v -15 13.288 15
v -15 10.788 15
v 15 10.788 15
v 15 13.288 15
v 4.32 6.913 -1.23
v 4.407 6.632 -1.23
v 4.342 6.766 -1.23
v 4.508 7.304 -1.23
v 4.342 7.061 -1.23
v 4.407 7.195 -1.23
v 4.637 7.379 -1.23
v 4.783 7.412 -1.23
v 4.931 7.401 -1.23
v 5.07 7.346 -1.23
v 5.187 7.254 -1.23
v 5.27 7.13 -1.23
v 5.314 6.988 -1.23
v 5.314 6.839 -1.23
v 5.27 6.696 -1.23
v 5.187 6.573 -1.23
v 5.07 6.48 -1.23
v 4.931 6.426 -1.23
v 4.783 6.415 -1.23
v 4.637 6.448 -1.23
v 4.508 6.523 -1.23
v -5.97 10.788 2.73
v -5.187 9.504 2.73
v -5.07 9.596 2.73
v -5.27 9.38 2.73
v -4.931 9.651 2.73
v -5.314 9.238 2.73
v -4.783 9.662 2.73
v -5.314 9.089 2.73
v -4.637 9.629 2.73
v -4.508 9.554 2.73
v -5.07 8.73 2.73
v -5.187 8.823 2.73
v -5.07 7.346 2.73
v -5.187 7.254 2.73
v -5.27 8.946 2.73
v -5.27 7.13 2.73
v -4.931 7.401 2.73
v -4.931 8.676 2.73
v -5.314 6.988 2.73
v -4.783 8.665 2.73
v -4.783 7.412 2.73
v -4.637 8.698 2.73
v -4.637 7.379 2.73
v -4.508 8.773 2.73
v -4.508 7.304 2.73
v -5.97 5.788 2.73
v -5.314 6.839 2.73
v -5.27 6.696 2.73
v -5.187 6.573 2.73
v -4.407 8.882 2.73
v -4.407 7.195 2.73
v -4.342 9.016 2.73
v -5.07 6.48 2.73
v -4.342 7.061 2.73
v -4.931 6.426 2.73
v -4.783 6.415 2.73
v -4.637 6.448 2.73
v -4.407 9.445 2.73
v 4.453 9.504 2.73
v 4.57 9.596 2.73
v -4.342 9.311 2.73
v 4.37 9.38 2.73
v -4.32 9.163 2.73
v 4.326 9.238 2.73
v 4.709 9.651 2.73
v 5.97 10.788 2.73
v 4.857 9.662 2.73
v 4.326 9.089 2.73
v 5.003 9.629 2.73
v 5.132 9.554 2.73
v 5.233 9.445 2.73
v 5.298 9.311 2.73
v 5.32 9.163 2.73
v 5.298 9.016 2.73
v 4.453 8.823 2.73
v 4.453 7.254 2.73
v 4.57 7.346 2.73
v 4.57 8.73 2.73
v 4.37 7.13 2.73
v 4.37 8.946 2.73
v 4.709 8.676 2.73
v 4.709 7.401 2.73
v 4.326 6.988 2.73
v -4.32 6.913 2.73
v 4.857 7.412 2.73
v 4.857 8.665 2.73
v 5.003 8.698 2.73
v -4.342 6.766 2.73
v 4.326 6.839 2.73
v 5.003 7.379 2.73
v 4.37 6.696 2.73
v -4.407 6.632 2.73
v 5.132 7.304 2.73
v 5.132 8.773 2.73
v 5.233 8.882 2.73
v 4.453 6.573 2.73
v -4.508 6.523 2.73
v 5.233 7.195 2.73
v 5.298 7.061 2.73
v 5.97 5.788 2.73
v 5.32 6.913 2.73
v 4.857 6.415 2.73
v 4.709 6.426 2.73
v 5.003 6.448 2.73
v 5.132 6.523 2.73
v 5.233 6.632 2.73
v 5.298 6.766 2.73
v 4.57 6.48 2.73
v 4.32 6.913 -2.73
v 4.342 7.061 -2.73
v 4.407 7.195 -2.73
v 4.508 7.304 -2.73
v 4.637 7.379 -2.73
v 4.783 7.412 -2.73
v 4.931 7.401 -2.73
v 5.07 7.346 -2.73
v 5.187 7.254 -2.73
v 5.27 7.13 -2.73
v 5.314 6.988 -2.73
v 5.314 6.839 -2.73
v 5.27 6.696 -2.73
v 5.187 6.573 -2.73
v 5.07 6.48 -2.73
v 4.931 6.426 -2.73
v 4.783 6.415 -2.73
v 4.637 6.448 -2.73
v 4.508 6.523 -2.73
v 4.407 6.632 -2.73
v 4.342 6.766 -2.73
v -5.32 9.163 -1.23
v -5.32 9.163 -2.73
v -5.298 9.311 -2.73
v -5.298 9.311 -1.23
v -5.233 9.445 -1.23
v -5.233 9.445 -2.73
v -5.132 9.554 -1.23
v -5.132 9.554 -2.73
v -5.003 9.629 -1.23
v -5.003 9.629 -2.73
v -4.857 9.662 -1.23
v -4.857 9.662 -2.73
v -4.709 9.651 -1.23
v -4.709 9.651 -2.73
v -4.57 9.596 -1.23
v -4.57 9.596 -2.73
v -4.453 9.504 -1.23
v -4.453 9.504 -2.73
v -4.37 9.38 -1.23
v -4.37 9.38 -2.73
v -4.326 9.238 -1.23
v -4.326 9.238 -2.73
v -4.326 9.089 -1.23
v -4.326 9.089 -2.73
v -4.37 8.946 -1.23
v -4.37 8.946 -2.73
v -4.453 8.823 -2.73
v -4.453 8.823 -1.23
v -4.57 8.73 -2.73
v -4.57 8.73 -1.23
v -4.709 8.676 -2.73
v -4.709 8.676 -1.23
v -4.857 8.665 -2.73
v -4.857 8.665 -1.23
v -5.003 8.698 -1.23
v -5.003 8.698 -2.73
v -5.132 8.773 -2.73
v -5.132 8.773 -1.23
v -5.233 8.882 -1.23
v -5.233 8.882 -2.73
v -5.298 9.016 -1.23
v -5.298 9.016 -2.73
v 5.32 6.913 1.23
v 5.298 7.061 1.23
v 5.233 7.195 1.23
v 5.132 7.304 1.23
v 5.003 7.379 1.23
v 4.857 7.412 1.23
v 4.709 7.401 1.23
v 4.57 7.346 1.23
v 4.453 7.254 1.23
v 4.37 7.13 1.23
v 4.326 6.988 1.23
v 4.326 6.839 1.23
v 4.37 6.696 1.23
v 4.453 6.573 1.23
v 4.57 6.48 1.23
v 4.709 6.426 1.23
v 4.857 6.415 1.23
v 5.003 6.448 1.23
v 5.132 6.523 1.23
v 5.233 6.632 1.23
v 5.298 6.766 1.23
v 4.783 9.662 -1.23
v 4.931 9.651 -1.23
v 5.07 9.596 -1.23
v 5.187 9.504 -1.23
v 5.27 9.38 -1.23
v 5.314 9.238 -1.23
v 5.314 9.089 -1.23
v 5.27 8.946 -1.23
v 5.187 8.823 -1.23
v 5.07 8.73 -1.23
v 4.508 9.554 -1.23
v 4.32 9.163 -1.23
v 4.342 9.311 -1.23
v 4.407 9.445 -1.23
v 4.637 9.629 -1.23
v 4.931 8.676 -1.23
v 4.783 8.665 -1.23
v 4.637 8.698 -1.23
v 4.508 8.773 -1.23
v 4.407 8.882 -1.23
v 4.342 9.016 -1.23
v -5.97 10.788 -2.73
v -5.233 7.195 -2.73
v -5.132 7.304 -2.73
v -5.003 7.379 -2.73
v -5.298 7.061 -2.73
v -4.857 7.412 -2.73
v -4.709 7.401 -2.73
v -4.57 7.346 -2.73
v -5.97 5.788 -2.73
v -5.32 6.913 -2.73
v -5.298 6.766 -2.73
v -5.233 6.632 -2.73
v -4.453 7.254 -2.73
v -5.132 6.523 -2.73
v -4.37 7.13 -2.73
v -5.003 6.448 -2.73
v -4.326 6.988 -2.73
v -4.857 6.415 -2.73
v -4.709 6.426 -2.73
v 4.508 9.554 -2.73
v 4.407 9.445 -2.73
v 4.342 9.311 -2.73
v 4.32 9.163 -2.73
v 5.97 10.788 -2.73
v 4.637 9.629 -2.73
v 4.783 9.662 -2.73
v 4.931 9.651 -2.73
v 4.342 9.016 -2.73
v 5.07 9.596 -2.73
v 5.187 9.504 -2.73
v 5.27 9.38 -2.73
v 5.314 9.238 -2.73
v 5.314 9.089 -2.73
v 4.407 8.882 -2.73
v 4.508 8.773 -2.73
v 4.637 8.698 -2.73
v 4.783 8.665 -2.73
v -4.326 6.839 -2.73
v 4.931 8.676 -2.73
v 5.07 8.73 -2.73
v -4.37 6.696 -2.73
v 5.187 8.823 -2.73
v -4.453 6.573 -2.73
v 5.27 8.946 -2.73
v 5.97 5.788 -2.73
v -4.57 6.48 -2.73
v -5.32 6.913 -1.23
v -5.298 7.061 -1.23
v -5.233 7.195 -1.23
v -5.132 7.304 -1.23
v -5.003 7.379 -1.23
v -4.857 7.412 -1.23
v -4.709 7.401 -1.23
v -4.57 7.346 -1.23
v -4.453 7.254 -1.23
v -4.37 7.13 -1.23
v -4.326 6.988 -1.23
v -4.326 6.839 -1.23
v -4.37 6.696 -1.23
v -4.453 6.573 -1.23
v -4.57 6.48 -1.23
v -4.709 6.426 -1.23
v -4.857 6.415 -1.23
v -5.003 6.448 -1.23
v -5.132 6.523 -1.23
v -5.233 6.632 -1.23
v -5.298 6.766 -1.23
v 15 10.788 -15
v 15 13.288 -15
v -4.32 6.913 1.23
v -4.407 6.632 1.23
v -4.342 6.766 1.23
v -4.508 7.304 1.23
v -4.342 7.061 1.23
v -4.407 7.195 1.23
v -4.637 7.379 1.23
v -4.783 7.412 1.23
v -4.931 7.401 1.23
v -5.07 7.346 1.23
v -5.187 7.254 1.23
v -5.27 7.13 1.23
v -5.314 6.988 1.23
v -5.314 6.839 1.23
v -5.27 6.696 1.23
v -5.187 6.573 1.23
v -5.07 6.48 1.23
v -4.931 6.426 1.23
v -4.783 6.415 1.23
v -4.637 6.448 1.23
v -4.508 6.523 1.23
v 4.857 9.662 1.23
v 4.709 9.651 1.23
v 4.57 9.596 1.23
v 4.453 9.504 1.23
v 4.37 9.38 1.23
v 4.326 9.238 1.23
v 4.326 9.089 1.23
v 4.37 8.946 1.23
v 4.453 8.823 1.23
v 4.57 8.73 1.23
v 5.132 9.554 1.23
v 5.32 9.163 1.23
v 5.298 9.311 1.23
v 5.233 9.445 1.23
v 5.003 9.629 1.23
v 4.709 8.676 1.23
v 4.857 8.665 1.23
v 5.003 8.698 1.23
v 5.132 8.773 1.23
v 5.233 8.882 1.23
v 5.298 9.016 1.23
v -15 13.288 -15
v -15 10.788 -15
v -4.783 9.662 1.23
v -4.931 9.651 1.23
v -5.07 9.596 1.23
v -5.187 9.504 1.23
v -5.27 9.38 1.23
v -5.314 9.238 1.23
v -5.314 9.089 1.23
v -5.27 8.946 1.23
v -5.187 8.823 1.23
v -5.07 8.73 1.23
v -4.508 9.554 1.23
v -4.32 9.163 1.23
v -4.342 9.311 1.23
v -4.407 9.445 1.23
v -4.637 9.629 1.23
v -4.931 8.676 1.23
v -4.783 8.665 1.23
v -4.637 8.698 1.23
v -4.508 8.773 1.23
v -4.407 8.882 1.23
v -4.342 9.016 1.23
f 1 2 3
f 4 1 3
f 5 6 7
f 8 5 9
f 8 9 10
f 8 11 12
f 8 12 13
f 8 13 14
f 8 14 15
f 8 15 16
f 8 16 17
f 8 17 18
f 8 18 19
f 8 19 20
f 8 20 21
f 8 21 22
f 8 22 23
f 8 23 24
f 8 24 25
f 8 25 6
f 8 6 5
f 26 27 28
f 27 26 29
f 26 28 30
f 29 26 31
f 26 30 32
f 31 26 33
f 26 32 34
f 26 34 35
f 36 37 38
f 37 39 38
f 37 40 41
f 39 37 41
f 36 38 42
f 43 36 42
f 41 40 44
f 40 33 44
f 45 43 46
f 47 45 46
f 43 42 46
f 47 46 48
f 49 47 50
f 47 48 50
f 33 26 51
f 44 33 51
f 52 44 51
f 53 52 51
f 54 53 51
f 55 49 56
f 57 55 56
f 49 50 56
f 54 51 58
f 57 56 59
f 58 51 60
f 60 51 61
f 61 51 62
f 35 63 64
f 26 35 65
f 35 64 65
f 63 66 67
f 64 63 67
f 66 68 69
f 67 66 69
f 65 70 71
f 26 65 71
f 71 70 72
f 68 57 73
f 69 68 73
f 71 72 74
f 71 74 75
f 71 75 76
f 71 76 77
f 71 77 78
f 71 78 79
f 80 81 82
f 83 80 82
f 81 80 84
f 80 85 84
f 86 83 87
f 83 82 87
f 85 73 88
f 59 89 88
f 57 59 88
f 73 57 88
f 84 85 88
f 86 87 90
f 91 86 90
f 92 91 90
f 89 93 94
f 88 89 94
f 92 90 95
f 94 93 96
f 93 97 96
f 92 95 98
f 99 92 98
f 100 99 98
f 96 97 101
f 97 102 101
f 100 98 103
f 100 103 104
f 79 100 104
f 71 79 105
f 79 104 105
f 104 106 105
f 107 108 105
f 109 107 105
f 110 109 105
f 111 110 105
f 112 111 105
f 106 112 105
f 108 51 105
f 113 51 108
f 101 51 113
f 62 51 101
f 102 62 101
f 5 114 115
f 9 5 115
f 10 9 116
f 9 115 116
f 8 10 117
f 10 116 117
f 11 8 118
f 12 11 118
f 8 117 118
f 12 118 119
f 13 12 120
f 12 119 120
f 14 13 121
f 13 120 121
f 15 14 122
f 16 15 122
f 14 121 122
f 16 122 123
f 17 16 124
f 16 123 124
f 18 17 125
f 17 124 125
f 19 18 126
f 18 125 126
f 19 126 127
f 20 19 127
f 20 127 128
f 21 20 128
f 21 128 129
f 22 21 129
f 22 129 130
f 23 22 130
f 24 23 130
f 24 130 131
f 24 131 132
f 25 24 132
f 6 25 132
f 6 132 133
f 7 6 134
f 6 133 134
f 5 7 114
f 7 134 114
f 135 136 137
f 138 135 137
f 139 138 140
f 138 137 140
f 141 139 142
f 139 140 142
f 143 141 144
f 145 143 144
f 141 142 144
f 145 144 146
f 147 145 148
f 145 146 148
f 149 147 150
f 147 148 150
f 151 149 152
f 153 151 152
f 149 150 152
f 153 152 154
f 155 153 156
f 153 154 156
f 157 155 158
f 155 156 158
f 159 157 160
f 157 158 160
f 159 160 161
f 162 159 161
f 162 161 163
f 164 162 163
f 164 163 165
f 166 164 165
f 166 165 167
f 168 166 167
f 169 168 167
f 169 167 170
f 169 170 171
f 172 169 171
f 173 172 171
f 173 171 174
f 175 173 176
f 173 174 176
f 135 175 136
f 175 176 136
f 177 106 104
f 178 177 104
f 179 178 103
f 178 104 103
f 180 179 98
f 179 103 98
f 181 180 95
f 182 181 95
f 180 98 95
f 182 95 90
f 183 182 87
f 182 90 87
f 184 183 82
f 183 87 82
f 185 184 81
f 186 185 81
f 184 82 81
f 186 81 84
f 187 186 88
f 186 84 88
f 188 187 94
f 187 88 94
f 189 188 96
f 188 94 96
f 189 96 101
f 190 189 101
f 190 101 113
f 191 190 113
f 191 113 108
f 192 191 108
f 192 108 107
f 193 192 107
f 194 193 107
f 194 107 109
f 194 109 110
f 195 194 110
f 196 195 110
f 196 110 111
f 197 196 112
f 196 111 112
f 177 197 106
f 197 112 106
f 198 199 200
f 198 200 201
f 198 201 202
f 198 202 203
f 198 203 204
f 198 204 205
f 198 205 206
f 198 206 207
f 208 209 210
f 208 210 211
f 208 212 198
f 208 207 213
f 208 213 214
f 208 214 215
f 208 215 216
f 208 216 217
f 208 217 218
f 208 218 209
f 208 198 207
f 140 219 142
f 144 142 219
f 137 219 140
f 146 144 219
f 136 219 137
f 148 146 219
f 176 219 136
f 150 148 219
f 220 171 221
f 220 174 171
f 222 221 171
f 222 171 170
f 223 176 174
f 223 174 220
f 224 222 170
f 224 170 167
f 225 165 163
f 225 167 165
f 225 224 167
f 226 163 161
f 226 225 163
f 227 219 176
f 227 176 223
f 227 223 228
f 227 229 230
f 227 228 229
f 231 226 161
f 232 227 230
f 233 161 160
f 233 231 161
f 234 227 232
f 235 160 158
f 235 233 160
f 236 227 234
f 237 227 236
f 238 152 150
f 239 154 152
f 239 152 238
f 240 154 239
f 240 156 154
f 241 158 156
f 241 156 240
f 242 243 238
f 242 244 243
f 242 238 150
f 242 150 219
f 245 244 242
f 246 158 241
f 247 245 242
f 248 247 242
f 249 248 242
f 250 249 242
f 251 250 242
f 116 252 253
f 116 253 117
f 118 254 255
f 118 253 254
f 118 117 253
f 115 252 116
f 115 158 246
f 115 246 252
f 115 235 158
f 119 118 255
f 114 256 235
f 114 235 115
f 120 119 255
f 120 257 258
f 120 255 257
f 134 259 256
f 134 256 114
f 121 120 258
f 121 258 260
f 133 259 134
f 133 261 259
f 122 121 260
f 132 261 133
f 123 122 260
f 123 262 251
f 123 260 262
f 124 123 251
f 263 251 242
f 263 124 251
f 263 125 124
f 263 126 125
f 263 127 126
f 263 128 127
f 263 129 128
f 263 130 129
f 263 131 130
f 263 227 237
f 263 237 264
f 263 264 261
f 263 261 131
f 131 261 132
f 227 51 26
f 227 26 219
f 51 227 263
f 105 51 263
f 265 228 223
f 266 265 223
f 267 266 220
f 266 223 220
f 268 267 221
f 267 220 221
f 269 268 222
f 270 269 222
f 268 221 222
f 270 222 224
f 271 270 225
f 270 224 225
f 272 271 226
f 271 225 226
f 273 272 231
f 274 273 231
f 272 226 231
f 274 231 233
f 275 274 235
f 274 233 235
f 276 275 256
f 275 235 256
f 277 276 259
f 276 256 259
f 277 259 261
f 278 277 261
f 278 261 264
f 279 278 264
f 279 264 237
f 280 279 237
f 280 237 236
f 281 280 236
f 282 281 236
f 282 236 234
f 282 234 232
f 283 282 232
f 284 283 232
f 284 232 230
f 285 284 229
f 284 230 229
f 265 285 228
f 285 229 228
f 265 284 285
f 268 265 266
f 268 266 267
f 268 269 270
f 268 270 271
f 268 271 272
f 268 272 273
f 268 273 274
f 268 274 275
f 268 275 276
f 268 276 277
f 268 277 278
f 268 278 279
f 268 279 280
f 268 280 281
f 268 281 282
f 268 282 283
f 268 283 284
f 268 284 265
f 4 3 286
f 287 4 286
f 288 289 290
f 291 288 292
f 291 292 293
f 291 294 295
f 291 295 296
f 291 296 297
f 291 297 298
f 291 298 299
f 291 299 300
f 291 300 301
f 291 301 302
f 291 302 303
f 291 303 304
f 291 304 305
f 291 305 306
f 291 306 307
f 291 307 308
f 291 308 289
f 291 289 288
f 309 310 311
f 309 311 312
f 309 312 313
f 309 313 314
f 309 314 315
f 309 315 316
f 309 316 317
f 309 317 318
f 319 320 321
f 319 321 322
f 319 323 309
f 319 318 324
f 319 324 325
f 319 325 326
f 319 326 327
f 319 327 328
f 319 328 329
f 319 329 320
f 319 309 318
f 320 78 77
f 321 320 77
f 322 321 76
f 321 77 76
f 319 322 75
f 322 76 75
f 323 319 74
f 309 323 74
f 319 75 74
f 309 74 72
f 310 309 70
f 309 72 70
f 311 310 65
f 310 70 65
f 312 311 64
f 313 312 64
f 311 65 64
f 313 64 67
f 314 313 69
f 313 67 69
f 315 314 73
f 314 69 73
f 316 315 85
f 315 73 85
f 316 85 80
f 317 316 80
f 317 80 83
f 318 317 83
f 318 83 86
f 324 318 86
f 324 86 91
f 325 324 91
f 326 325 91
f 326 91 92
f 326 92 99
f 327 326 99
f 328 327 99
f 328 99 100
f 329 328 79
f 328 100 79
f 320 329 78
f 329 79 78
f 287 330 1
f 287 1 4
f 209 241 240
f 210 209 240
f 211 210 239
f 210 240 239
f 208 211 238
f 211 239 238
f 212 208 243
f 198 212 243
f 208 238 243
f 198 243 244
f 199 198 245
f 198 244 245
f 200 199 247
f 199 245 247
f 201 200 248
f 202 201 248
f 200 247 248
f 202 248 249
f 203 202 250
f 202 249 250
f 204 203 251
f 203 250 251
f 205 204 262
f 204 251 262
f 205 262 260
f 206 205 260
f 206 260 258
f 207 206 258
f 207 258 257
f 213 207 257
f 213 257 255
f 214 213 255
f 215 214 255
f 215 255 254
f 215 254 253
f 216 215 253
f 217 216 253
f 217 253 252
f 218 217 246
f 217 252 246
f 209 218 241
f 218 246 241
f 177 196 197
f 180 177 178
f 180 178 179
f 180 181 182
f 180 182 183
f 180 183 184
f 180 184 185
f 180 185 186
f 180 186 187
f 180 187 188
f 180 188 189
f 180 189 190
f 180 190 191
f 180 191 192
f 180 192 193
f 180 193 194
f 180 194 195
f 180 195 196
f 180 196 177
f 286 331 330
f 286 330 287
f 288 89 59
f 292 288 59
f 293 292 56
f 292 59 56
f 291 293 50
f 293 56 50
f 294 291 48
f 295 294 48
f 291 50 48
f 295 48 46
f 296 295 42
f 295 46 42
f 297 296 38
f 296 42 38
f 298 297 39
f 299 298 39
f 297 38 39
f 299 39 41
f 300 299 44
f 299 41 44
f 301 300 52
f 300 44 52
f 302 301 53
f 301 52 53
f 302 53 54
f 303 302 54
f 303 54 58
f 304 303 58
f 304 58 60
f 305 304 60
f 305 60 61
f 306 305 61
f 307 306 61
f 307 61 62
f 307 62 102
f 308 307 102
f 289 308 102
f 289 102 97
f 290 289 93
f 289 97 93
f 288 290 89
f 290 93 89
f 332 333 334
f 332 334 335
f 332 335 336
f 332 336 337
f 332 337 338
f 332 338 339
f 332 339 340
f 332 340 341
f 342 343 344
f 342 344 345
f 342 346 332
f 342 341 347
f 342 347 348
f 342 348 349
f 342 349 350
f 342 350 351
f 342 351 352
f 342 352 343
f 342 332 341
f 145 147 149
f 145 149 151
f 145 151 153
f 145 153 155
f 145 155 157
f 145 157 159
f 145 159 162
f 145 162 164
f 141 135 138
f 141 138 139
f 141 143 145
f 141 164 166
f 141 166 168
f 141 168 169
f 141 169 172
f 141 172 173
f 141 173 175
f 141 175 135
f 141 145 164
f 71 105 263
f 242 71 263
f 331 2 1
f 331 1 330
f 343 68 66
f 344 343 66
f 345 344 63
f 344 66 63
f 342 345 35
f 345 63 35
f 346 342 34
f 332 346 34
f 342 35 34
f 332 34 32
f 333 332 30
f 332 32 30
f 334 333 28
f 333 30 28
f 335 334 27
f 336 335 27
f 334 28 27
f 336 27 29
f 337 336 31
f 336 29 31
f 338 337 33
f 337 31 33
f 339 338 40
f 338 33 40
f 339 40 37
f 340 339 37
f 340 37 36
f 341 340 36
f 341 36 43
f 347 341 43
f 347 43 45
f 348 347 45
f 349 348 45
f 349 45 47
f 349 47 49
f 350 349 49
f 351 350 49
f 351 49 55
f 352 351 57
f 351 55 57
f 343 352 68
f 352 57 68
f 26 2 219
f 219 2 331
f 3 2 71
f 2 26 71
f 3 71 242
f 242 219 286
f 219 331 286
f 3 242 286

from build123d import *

# Parameters (mm, degrees)
IZIM1_W                     = 23.88
IZIM1_H                     = 10.92
Y_KSEKLIK_EKSTR_ZYON5_DEPTH = 10
IZIM4_W                     = 60
IZIM4_H                     = 60
Y_KSEKLIK_EKSTR_ZYON6_DEPTH = 5
IZIM5_R                     = 1
KES_EKSTR_ZYON1_DEPTH       = 3
IZIM6_R                     = 1
KES_EKSTR_ZYON2_DEPTH       = 3
L_EK1_SCALE                 = 0.5


with BuildPart() as part:
    # Çizim1 → Yükseklik-Ekstrüzyon5 (new body)
    with BuildSketch(Plane(origin=(0, 0, 0), x_dir=(1, 0, 0), z_dir=(0, 1, 0))):
        Rectangle(IZIM1_W, IZIM1_H)
    extrude(amount=Y_KSEKLIK_EKSTR_ZYON5_DEPTH)

    # Çizim4 → Yükseklik-Ekstrüzyon6 (add)
    with BuildSketch(Plane(origin=(0, 10, 0), x_dir=(1, 0, 0), z_dir=(0, 1, 0))):
        Rectangle(IZIM4_W, IZIM4_H)
    extrude(amount=Y_KSEKLIK_EKSTR_ZYON6_DEPTH)

    # Çizim5 → Kes-Ekstrüzyon1 (cut)
    with BuildSketch(Plane.XY.offset(5.46)):
        with Locations((9.64, 2.25)):
            Circle(IZIM5_R)
        with Locations((9.64, 6.75)):
            Circle(IZIM5_R)
        with Locations((-9.64, 6.75)):
            Circle(IZIM5_R)
        with Locations((-9.64, 2.25)):
            Circle(IZIM5_R)
    extrude(amount=-KES_EKSTR_ZYON1_DEPTH, mode=Mode.SUBTRACT)

    # Çizim6 → Kes-Ekstrüzyon2 (cut)
    with BuildSketch(Plane(origin=(0, 0, -5.46), x_dir=(-1, 0, 0), z_dir=(0, 0, -1))):
        with Locations((9.64, 2.25)):
            Circle(IZIM6_R)
        with Locations((9.64, 6.75)):
            Circle(IZIM6_R)
        with Locations((-9.64, 6.75)):
            Circle(IZIM6_R)
        with Locations((-9.64, 2.25)):
            Circle(IZIM6_R)
    extrude(amount=-KES_EKSTR_ZYON2_DEPTH, mode=Mode.SUBTRACT)


with BuildPart() as part_1:
    # Ölçek1: scaled about (0, 11.57684301, 0)
    add(part.part.scale(L_EK1_SCALE).moved(Location((0, 5.788421505, 0))))


solid = part_1.part
